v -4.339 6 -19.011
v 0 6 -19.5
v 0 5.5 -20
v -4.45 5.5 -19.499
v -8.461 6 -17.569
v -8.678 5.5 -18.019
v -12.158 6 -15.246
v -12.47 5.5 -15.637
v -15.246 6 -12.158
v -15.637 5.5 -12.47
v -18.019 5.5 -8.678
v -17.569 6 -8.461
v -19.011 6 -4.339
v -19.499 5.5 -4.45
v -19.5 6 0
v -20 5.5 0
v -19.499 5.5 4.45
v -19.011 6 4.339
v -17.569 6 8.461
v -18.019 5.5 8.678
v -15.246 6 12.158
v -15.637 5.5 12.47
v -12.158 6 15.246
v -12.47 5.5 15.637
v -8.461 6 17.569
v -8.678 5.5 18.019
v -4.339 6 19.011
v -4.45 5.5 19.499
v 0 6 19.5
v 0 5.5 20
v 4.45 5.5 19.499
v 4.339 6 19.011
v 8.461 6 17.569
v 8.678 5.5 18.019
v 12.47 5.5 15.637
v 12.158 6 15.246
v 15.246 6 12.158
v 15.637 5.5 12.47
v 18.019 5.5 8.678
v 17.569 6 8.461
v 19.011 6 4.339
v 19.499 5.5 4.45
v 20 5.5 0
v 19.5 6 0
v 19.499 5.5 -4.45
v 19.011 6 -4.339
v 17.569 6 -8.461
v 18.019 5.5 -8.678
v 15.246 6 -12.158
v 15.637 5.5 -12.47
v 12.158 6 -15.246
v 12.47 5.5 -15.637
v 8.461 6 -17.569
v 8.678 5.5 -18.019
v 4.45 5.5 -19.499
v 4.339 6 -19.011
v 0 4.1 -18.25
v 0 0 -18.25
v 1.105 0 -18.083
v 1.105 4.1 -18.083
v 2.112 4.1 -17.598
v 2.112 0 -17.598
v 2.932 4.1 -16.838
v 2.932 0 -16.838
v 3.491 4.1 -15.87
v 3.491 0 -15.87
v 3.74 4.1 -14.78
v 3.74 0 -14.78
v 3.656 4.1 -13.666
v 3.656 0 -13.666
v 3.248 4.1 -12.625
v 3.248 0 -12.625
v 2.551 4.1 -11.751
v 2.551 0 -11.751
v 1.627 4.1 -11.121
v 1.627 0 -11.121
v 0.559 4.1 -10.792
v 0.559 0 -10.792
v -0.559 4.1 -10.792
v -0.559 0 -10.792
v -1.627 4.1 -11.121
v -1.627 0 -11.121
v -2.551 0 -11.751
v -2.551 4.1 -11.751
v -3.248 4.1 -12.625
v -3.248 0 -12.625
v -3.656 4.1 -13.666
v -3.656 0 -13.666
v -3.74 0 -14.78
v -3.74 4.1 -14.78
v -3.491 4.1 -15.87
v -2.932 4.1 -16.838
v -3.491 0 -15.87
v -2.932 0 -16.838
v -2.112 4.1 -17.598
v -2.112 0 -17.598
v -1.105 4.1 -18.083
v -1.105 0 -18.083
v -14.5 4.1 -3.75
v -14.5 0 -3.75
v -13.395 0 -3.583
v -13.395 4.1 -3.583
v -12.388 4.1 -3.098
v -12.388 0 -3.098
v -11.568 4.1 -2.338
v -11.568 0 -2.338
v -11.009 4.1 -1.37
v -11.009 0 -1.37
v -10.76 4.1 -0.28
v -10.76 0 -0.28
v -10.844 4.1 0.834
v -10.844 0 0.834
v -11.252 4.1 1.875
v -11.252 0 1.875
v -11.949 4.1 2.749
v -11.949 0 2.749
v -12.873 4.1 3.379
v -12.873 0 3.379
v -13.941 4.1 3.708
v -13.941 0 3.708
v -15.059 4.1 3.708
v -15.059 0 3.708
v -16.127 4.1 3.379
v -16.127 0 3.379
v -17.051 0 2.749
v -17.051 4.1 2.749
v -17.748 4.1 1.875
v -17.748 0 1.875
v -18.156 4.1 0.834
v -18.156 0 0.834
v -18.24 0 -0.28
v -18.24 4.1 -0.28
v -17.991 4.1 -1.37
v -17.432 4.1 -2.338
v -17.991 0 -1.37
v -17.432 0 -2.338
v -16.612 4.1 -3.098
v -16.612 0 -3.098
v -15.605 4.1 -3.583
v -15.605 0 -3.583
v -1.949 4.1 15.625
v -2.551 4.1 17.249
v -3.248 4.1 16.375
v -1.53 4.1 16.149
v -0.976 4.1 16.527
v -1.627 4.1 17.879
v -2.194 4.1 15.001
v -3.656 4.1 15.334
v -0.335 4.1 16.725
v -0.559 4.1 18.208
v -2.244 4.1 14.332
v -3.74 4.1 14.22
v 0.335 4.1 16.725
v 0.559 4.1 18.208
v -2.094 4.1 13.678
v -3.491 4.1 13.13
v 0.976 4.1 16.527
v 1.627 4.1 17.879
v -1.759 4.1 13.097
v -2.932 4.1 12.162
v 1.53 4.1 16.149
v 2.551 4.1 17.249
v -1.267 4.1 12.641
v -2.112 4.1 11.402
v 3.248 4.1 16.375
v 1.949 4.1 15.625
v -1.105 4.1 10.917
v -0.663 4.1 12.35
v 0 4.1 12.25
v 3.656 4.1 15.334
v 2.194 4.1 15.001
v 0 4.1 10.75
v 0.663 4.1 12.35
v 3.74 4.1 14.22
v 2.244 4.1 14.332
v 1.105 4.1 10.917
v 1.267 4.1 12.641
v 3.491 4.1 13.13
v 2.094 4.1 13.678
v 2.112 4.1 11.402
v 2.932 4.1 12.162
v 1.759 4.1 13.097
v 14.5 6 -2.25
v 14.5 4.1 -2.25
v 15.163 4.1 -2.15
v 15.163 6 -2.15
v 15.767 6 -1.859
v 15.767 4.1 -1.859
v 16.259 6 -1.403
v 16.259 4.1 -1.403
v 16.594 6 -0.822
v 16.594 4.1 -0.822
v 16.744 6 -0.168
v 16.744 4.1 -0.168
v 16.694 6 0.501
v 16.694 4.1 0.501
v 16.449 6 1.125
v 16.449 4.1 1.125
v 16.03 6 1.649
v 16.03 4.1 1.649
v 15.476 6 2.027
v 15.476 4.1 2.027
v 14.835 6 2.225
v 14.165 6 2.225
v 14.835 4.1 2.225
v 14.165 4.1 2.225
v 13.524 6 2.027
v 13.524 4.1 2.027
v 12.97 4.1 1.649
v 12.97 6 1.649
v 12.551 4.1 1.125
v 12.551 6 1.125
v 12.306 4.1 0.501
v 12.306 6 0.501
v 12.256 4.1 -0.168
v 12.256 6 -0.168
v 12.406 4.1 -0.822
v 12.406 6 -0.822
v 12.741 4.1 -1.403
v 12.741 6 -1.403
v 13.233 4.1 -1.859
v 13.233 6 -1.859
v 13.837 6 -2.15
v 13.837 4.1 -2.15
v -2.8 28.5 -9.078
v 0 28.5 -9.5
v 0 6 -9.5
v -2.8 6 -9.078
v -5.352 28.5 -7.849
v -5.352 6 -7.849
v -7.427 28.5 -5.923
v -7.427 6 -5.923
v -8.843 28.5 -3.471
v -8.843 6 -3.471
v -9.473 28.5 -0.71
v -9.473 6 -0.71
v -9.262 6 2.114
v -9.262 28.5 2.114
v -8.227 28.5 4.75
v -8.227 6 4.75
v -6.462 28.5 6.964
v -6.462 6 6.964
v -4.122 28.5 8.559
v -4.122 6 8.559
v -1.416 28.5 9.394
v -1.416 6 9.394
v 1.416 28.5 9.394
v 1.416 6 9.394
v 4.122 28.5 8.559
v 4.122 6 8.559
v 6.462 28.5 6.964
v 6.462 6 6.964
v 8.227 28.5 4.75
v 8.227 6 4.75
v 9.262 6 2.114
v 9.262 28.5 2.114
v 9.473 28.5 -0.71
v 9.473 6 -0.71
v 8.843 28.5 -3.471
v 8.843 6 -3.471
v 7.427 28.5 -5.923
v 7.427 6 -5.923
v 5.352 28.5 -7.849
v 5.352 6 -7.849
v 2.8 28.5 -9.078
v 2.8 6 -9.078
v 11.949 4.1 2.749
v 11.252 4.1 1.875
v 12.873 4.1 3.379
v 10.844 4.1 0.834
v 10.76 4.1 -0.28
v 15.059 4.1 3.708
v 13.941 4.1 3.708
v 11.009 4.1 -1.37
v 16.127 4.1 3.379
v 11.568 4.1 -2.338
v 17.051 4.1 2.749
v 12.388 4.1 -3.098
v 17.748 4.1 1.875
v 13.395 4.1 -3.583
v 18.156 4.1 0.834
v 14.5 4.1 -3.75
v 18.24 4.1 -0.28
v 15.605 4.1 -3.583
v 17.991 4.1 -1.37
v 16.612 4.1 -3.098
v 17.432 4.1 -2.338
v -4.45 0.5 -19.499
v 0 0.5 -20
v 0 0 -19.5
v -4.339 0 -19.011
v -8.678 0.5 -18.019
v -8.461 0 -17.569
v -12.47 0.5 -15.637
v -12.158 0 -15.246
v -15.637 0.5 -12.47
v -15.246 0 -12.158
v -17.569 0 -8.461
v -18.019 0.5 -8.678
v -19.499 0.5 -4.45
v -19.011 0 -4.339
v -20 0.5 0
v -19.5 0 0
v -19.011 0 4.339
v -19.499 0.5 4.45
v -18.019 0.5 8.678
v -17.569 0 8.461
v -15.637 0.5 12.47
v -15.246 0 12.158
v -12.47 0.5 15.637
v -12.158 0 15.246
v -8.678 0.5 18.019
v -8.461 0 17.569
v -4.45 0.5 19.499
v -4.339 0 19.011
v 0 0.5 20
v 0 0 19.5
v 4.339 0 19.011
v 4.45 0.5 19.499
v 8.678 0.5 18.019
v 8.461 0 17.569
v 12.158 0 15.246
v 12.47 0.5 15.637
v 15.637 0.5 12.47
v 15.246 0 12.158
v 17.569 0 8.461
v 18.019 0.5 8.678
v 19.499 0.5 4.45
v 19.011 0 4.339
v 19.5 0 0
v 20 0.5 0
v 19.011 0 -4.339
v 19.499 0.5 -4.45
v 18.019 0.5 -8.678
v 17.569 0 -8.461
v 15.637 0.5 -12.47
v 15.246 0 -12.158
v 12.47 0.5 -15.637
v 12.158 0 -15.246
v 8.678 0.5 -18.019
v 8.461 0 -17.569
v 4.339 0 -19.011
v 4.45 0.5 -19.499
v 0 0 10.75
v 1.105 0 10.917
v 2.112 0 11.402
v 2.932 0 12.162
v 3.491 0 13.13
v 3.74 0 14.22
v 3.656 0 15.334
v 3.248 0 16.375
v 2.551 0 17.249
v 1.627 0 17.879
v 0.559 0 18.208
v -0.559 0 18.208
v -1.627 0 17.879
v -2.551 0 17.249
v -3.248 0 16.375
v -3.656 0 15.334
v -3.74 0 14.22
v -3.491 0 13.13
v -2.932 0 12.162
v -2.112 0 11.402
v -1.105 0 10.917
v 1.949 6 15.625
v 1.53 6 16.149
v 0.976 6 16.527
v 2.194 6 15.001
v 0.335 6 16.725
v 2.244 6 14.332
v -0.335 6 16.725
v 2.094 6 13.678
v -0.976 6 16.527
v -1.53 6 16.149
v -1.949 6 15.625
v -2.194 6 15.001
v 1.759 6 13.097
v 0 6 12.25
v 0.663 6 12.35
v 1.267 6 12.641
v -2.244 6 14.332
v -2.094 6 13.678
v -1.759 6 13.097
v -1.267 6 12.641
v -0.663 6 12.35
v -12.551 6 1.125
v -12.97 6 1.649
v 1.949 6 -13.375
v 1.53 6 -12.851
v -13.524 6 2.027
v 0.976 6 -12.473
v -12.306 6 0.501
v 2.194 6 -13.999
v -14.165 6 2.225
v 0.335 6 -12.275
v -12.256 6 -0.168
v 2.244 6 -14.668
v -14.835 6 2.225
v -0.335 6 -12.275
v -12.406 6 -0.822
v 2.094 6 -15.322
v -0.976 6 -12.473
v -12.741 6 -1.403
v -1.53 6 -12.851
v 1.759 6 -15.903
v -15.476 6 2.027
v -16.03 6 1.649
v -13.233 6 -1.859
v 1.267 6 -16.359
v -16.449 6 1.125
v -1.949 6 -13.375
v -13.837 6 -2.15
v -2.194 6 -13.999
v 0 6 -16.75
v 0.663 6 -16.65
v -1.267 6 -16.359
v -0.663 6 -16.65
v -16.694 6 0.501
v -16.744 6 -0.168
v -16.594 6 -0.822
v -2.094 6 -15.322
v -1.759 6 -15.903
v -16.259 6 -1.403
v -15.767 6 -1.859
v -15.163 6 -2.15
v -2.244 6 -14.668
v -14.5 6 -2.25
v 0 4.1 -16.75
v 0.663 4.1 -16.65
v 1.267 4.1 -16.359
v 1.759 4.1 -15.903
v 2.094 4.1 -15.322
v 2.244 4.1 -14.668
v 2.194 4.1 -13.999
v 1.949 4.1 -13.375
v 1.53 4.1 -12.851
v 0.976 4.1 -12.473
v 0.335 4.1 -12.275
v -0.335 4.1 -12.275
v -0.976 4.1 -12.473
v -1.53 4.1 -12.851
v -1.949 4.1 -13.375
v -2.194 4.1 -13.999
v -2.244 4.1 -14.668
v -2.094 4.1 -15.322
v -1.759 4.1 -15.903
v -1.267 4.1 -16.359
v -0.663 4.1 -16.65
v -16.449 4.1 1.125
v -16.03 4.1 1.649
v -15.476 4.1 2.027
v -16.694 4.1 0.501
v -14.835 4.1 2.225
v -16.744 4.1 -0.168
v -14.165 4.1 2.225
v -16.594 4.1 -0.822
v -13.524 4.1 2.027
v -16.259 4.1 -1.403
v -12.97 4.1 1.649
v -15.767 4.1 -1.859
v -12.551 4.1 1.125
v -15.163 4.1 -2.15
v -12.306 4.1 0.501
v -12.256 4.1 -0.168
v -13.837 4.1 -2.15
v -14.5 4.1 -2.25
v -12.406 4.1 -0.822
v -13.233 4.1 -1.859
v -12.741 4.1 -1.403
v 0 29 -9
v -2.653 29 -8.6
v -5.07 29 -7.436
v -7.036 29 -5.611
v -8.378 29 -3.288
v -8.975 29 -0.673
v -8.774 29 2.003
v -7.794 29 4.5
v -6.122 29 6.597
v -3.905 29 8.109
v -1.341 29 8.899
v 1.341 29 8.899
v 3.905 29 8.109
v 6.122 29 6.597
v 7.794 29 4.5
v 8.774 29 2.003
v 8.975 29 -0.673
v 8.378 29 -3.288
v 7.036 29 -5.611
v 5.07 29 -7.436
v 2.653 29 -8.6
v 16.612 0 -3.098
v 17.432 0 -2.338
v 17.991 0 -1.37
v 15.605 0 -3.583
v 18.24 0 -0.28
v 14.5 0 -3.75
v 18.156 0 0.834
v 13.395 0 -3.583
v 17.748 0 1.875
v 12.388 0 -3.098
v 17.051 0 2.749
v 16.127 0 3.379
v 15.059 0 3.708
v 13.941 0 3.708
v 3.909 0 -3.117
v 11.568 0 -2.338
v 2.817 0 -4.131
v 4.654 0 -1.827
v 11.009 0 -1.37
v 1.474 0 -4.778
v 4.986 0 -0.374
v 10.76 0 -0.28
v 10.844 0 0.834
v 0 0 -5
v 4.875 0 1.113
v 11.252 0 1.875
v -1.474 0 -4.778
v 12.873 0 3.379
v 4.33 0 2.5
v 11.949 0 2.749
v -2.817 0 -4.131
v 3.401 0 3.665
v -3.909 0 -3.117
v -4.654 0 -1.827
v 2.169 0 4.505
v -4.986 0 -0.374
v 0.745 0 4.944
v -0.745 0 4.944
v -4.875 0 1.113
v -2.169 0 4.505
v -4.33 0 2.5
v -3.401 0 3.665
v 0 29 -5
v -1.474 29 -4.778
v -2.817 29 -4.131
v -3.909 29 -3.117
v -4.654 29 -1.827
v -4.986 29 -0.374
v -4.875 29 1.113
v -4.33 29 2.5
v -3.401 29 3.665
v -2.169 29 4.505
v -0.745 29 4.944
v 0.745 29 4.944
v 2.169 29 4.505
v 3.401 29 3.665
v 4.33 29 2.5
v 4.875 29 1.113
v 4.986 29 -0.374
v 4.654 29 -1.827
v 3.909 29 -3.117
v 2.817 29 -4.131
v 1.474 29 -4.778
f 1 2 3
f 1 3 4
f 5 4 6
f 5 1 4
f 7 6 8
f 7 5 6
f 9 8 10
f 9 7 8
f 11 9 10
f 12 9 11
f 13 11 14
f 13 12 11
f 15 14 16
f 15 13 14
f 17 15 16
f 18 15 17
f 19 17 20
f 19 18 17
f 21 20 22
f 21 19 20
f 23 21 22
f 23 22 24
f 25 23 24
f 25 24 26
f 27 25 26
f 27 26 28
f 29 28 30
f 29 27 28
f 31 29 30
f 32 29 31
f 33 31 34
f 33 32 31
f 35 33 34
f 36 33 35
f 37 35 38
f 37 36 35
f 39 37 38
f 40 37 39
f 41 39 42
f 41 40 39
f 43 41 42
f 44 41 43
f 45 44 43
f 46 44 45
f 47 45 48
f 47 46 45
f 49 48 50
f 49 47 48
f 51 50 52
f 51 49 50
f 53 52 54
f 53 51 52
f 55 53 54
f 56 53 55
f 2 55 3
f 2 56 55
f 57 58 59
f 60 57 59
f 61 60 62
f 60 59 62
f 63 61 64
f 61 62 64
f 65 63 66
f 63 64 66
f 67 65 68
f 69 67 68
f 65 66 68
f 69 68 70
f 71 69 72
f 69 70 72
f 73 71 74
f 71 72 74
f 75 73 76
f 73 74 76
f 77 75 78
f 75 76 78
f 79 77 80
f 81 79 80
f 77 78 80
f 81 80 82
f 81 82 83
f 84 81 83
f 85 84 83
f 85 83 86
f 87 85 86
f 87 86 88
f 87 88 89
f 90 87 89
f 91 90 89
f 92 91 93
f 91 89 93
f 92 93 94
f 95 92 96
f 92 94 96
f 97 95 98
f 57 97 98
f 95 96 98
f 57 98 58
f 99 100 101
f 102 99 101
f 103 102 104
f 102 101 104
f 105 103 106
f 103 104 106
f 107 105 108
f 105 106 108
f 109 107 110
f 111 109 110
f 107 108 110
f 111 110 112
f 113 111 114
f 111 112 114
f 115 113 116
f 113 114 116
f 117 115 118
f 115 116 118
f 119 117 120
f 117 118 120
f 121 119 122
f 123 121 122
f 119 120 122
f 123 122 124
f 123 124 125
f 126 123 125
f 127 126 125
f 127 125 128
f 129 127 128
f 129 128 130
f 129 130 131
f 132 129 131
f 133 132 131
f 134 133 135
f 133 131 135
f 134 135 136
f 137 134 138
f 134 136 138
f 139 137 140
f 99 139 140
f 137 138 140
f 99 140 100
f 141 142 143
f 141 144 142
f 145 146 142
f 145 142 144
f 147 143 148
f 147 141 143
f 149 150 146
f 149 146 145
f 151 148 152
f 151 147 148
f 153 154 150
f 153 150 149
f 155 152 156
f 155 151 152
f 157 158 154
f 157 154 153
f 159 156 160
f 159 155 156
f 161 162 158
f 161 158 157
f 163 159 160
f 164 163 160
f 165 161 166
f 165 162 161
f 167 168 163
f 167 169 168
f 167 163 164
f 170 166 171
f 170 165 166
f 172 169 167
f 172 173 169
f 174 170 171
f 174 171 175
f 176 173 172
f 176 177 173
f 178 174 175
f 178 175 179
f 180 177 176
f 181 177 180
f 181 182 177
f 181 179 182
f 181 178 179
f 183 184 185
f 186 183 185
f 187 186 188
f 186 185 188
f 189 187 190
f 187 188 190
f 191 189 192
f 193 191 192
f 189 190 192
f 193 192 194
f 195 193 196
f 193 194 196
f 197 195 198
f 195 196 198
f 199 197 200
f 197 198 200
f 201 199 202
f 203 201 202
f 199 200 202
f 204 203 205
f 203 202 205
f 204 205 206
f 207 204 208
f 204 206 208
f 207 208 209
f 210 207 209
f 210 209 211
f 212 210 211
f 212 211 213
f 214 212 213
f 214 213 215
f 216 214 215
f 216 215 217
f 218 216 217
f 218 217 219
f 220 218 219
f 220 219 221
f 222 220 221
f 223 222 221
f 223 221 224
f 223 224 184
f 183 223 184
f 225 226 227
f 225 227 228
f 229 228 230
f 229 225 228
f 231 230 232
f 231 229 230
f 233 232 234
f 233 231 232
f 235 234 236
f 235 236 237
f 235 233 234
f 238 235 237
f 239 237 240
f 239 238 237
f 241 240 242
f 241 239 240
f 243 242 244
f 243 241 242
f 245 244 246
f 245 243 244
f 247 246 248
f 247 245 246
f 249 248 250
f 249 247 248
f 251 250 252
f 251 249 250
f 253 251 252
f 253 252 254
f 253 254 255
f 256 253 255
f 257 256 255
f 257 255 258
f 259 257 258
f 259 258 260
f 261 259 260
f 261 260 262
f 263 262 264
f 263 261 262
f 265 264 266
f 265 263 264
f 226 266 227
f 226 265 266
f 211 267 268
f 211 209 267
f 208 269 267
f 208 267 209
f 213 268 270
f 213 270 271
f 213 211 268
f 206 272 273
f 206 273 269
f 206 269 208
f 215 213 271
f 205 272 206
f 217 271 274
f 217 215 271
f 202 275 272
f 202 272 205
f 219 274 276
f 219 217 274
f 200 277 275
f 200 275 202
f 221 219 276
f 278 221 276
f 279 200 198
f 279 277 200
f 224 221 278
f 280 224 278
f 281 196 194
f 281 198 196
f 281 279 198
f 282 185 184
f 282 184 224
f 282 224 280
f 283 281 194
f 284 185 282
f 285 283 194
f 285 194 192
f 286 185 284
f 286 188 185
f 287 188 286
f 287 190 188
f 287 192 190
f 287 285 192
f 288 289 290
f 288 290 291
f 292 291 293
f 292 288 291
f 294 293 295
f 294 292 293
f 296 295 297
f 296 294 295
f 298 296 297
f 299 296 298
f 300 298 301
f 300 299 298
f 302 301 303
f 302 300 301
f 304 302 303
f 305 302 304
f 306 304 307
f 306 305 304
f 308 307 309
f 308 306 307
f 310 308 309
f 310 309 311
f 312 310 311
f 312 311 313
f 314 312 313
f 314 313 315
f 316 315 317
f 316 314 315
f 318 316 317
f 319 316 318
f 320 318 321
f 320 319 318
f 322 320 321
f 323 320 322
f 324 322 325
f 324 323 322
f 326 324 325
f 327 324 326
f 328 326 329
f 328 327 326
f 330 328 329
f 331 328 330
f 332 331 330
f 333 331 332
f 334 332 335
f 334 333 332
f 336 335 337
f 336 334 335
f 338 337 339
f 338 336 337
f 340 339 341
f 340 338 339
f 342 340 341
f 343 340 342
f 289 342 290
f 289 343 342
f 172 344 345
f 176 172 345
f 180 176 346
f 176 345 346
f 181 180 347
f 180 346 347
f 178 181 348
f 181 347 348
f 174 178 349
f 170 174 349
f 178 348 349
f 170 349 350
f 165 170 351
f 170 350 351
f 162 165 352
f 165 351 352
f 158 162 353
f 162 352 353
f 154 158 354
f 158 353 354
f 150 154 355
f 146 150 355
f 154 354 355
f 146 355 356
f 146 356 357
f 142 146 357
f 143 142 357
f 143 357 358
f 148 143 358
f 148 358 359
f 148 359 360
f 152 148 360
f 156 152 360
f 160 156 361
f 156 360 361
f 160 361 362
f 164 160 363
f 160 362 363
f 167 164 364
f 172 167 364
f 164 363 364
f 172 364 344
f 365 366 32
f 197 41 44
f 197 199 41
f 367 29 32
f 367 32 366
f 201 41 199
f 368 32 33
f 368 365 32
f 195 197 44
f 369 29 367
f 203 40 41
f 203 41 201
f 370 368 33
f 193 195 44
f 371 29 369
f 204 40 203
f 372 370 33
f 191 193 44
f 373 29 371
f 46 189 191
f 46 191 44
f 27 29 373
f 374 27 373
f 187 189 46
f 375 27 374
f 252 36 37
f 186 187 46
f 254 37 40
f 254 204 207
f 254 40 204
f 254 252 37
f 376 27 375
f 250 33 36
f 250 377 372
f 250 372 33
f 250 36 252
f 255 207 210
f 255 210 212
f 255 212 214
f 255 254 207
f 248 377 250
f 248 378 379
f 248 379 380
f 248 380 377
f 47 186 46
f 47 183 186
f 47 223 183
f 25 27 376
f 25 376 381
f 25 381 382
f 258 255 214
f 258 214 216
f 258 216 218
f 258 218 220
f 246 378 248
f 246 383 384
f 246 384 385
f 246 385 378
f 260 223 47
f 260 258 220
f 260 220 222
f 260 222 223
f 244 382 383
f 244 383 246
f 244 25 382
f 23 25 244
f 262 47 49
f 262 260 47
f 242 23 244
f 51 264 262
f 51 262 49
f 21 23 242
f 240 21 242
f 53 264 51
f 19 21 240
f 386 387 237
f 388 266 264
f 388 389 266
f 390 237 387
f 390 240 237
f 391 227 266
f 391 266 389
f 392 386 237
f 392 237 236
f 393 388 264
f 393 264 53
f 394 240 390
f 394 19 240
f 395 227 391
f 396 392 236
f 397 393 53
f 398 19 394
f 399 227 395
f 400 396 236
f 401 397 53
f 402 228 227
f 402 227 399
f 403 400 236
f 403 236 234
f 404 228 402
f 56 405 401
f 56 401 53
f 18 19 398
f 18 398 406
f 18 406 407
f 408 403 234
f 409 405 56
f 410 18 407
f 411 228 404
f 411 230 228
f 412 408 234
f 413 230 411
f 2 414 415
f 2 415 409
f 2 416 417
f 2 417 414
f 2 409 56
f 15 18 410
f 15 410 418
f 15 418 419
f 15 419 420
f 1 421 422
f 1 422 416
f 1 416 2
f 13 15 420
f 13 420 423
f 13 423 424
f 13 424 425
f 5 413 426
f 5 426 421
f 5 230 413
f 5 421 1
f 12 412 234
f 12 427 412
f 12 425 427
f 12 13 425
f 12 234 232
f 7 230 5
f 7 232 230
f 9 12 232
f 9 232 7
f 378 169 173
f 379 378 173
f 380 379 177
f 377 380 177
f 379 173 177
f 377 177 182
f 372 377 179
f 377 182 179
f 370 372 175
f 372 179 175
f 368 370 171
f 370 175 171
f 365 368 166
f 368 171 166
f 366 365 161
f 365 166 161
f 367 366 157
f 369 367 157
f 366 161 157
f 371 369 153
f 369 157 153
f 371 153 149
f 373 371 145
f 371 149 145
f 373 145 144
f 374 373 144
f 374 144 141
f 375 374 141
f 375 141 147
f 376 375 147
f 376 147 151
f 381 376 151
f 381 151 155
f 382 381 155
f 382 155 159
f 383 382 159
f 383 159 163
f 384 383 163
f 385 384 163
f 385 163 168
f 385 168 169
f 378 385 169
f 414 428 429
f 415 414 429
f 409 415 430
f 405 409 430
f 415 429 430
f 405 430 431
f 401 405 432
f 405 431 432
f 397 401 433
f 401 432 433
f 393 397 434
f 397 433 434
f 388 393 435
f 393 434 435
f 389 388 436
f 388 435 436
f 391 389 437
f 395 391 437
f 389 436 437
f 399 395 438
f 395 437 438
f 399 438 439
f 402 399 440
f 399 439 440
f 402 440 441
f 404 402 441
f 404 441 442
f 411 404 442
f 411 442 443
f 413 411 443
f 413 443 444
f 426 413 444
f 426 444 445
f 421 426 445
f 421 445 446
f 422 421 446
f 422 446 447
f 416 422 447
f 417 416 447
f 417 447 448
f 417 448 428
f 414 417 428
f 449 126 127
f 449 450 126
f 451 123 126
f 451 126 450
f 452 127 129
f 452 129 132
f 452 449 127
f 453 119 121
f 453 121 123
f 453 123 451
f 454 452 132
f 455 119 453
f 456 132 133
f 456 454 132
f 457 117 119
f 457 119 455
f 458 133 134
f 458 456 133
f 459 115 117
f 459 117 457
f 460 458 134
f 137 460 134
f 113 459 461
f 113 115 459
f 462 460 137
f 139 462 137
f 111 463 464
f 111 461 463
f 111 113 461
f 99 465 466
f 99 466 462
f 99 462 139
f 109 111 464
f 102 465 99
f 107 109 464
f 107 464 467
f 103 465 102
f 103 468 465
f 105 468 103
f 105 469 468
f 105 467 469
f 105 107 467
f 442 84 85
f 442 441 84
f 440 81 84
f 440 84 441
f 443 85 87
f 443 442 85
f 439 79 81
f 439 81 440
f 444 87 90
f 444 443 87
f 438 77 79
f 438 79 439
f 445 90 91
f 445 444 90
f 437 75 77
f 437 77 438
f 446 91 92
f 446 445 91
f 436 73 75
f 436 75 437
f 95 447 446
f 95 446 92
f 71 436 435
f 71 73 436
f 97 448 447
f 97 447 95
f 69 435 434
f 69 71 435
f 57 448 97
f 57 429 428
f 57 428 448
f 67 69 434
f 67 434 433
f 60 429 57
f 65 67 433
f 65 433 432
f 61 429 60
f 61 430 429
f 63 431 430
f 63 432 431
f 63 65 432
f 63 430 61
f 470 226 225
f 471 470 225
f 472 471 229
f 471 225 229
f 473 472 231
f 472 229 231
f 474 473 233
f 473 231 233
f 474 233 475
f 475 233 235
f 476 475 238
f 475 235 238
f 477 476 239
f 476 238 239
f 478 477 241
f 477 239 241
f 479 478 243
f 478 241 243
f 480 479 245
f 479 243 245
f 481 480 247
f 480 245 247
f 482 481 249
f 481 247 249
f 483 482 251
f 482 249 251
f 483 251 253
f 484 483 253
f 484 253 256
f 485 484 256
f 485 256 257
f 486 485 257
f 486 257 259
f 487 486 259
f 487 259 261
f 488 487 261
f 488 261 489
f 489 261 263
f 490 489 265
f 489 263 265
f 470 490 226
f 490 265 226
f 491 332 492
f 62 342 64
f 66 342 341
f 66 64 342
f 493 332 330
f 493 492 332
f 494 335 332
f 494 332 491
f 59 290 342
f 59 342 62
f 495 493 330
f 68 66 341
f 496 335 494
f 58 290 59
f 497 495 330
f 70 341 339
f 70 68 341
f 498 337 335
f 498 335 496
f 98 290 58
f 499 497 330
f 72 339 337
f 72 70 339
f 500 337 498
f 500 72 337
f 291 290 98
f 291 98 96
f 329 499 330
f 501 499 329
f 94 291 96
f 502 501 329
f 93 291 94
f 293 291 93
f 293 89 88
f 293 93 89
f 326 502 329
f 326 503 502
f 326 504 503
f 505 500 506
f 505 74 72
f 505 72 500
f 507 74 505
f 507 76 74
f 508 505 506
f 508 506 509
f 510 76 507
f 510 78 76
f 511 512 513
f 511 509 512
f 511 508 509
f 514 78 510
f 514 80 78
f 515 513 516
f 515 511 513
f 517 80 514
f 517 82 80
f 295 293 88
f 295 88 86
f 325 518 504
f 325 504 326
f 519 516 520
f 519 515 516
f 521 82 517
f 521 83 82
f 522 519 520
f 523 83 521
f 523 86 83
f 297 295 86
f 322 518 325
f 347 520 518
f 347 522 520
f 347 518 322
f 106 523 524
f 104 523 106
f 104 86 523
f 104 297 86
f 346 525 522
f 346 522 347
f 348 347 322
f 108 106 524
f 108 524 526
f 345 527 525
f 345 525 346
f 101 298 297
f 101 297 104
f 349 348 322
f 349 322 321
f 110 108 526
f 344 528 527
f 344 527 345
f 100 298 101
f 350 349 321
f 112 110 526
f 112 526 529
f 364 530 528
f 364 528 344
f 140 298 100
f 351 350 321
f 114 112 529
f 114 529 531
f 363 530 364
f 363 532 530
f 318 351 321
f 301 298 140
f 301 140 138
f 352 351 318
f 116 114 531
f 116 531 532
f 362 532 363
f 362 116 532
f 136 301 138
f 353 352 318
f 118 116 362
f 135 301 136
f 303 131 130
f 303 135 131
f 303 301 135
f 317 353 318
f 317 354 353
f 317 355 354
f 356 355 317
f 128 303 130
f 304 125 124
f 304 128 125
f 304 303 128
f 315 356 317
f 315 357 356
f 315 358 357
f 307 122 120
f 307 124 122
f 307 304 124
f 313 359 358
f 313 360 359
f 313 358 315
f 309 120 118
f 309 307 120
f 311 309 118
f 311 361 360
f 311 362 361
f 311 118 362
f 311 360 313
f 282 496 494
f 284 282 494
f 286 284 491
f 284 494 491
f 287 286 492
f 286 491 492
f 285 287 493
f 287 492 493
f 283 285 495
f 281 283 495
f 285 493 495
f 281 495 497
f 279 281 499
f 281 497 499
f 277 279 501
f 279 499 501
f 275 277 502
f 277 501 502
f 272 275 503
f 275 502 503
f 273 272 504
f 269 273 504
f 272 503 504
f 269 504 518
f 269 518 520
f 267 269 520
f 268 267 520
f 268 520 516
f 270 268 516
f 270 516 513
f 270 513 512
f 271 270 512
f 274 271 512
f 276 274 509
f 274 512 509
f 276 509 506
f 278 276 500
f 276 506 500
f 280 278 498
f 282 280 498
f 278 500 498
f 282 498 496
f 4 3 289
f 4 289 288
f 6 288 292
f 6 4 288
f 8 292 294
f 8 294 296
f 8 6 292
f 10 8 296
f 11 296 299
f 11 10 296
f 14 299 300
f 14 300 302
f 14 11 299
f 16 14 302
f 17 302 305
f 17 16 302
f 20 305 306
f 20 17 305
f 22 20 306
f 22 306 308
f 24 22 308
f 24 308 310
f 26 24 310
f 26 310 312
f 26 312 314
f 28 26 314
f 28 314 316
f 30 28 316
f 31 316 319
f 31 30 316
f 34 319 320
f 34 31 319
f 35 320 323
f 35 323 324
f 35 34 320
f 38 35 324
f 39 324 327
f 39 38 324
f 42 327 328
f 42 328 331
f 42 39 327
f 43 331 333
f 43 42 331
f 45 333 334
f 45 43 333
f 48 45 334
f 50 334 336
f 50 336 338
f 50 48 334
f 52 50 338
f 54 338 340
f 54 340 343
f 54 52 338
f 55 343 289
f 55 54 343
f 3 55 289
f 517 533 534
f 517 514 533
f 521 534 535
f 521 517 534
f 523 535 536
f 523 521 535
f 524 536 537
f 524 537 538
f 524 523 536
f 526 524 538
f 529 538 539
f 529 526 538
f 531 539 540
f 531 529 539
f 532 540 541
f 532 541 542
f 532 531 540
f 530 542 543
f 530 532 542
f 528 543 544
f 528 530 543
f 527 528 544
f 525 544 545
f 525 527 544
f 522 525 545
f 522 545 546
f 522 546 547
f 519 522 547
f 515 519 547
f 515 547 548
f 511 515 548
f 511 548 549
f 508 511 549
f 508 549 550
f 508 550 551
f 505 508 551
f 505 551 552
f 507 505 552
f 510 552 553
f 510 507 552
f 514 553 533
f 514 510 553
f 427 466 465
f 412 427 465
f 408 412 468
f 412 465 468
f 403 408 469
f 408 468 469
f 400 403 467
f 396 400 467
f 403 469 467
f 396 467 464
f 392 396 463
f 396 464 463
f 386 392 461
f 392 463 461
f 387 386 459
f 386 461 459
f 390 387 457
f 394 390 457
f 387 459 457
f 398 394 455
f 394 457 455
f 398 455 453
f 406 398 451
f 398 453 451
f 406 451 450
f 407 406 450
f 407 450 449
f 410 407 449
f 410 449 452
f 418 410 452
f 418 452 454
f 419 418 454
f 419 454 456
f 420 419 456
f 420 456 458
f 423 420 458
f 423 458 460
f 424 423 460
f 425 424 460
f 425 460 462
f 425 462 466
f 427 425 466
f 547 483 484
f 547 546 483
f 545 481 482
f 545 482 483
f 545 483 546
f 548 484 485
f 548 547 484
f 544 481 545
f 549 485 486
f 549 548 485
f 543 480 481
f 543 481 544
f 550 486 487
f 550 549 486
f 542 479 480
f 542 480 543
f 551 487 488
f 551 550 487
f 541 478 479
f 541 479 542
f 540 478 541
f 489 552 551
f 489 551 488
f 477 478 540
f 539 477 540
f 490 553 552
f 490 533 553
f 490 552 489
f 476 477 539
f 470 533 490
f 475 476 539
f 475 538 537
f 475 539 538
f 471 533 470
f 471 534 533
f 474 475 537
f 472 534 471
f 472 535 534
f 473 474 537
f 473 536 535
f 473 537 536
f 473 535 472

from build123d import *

# Parameters (mm, degrees)
SKETCH_2_R          = 2.25
CUT_EXTRUDE_1_DEPTH = 41.509258201
SKETCH_3_R          = 3.75
CUT_EXTRUDE_2_DEPTH = 4.1
CHAMFER_1_SIZE      = 0.5


with BuildPart() as part:
    # Эскиз1 → Повернуть1 (revolve)
    with BuildSketch(Plane.XY, mode=Mode.PRIVATE) as revolve_1_sk:
        Polygon((-5, 0), (-20, 0), (-20, 6), (-9.5, 6), (-9.5, 29), (-5, 29), align=None)
    revolve(revolve_1_sk.sketch.rotate(Axis((0, 0, 0), (0, 1, 0)), 270), axis=Axis((0, 0, 0), (0, 1, 0)))

    # Эскиз2 → Вырез-Вытянуть1 (cut, through all)
    with BuildSketch(Plane.XZ):
        with Locations(Location((0, 14.5, 0), (0, 0, 270))):
            Circle(SKETCH_2_R)
        with Locations(Location((14.5, 0, 0), (0, 0, 270))):
            Circle(SKETCH_2_R)
        with Locations(Location((0, -14.5, 0), (0, 0, 270))):
            Circle(SKETCH_2_R)
        with Locations(Location((-14.5, 0, 0), (0, 0, 270))):
            Circle(SKETCH_2_R)
    extrude(amount=-CUT_EXTRUDE_1_DEPTH, mode=Mode.SUBTRACT)

    # Эскиз3 → Вырез-Вытянуть2 (cut)
    with BuildSketch(Plane.XZ):
        with Locations(Location((0, 14.5, 0), (0, 0, 270))):
            Circle(SKETCH_3_R)
        with Locations(Location((14.5, 0, 0), (0, 0, 270))):
            Circle(SKETCH_3_R)
        with Locations(Location((0, -14.5, 0), (0, 0, 270))):
            Circle(SKETCH_3_R)
        with Locations(Location((-14.5, 0, 0), (0, 0, 270))):
            Circle(SKETCH_3_R)
    extrude(amount=-CUT_EXTRUDE_2_DEPTH, mode=Mode.SUBTRACT)

    # Фаска1
    chamfer_1_edges = [part.edges().sort_by_distance(p)[0] for p in [
        (0, 29, 9.5),
        (0, 6, 20),
        (0, 0, 20),
    ]]
    chamfer(chamfer_1_edges, length=CHAMFER_1_SIZE)


solid = part.part
